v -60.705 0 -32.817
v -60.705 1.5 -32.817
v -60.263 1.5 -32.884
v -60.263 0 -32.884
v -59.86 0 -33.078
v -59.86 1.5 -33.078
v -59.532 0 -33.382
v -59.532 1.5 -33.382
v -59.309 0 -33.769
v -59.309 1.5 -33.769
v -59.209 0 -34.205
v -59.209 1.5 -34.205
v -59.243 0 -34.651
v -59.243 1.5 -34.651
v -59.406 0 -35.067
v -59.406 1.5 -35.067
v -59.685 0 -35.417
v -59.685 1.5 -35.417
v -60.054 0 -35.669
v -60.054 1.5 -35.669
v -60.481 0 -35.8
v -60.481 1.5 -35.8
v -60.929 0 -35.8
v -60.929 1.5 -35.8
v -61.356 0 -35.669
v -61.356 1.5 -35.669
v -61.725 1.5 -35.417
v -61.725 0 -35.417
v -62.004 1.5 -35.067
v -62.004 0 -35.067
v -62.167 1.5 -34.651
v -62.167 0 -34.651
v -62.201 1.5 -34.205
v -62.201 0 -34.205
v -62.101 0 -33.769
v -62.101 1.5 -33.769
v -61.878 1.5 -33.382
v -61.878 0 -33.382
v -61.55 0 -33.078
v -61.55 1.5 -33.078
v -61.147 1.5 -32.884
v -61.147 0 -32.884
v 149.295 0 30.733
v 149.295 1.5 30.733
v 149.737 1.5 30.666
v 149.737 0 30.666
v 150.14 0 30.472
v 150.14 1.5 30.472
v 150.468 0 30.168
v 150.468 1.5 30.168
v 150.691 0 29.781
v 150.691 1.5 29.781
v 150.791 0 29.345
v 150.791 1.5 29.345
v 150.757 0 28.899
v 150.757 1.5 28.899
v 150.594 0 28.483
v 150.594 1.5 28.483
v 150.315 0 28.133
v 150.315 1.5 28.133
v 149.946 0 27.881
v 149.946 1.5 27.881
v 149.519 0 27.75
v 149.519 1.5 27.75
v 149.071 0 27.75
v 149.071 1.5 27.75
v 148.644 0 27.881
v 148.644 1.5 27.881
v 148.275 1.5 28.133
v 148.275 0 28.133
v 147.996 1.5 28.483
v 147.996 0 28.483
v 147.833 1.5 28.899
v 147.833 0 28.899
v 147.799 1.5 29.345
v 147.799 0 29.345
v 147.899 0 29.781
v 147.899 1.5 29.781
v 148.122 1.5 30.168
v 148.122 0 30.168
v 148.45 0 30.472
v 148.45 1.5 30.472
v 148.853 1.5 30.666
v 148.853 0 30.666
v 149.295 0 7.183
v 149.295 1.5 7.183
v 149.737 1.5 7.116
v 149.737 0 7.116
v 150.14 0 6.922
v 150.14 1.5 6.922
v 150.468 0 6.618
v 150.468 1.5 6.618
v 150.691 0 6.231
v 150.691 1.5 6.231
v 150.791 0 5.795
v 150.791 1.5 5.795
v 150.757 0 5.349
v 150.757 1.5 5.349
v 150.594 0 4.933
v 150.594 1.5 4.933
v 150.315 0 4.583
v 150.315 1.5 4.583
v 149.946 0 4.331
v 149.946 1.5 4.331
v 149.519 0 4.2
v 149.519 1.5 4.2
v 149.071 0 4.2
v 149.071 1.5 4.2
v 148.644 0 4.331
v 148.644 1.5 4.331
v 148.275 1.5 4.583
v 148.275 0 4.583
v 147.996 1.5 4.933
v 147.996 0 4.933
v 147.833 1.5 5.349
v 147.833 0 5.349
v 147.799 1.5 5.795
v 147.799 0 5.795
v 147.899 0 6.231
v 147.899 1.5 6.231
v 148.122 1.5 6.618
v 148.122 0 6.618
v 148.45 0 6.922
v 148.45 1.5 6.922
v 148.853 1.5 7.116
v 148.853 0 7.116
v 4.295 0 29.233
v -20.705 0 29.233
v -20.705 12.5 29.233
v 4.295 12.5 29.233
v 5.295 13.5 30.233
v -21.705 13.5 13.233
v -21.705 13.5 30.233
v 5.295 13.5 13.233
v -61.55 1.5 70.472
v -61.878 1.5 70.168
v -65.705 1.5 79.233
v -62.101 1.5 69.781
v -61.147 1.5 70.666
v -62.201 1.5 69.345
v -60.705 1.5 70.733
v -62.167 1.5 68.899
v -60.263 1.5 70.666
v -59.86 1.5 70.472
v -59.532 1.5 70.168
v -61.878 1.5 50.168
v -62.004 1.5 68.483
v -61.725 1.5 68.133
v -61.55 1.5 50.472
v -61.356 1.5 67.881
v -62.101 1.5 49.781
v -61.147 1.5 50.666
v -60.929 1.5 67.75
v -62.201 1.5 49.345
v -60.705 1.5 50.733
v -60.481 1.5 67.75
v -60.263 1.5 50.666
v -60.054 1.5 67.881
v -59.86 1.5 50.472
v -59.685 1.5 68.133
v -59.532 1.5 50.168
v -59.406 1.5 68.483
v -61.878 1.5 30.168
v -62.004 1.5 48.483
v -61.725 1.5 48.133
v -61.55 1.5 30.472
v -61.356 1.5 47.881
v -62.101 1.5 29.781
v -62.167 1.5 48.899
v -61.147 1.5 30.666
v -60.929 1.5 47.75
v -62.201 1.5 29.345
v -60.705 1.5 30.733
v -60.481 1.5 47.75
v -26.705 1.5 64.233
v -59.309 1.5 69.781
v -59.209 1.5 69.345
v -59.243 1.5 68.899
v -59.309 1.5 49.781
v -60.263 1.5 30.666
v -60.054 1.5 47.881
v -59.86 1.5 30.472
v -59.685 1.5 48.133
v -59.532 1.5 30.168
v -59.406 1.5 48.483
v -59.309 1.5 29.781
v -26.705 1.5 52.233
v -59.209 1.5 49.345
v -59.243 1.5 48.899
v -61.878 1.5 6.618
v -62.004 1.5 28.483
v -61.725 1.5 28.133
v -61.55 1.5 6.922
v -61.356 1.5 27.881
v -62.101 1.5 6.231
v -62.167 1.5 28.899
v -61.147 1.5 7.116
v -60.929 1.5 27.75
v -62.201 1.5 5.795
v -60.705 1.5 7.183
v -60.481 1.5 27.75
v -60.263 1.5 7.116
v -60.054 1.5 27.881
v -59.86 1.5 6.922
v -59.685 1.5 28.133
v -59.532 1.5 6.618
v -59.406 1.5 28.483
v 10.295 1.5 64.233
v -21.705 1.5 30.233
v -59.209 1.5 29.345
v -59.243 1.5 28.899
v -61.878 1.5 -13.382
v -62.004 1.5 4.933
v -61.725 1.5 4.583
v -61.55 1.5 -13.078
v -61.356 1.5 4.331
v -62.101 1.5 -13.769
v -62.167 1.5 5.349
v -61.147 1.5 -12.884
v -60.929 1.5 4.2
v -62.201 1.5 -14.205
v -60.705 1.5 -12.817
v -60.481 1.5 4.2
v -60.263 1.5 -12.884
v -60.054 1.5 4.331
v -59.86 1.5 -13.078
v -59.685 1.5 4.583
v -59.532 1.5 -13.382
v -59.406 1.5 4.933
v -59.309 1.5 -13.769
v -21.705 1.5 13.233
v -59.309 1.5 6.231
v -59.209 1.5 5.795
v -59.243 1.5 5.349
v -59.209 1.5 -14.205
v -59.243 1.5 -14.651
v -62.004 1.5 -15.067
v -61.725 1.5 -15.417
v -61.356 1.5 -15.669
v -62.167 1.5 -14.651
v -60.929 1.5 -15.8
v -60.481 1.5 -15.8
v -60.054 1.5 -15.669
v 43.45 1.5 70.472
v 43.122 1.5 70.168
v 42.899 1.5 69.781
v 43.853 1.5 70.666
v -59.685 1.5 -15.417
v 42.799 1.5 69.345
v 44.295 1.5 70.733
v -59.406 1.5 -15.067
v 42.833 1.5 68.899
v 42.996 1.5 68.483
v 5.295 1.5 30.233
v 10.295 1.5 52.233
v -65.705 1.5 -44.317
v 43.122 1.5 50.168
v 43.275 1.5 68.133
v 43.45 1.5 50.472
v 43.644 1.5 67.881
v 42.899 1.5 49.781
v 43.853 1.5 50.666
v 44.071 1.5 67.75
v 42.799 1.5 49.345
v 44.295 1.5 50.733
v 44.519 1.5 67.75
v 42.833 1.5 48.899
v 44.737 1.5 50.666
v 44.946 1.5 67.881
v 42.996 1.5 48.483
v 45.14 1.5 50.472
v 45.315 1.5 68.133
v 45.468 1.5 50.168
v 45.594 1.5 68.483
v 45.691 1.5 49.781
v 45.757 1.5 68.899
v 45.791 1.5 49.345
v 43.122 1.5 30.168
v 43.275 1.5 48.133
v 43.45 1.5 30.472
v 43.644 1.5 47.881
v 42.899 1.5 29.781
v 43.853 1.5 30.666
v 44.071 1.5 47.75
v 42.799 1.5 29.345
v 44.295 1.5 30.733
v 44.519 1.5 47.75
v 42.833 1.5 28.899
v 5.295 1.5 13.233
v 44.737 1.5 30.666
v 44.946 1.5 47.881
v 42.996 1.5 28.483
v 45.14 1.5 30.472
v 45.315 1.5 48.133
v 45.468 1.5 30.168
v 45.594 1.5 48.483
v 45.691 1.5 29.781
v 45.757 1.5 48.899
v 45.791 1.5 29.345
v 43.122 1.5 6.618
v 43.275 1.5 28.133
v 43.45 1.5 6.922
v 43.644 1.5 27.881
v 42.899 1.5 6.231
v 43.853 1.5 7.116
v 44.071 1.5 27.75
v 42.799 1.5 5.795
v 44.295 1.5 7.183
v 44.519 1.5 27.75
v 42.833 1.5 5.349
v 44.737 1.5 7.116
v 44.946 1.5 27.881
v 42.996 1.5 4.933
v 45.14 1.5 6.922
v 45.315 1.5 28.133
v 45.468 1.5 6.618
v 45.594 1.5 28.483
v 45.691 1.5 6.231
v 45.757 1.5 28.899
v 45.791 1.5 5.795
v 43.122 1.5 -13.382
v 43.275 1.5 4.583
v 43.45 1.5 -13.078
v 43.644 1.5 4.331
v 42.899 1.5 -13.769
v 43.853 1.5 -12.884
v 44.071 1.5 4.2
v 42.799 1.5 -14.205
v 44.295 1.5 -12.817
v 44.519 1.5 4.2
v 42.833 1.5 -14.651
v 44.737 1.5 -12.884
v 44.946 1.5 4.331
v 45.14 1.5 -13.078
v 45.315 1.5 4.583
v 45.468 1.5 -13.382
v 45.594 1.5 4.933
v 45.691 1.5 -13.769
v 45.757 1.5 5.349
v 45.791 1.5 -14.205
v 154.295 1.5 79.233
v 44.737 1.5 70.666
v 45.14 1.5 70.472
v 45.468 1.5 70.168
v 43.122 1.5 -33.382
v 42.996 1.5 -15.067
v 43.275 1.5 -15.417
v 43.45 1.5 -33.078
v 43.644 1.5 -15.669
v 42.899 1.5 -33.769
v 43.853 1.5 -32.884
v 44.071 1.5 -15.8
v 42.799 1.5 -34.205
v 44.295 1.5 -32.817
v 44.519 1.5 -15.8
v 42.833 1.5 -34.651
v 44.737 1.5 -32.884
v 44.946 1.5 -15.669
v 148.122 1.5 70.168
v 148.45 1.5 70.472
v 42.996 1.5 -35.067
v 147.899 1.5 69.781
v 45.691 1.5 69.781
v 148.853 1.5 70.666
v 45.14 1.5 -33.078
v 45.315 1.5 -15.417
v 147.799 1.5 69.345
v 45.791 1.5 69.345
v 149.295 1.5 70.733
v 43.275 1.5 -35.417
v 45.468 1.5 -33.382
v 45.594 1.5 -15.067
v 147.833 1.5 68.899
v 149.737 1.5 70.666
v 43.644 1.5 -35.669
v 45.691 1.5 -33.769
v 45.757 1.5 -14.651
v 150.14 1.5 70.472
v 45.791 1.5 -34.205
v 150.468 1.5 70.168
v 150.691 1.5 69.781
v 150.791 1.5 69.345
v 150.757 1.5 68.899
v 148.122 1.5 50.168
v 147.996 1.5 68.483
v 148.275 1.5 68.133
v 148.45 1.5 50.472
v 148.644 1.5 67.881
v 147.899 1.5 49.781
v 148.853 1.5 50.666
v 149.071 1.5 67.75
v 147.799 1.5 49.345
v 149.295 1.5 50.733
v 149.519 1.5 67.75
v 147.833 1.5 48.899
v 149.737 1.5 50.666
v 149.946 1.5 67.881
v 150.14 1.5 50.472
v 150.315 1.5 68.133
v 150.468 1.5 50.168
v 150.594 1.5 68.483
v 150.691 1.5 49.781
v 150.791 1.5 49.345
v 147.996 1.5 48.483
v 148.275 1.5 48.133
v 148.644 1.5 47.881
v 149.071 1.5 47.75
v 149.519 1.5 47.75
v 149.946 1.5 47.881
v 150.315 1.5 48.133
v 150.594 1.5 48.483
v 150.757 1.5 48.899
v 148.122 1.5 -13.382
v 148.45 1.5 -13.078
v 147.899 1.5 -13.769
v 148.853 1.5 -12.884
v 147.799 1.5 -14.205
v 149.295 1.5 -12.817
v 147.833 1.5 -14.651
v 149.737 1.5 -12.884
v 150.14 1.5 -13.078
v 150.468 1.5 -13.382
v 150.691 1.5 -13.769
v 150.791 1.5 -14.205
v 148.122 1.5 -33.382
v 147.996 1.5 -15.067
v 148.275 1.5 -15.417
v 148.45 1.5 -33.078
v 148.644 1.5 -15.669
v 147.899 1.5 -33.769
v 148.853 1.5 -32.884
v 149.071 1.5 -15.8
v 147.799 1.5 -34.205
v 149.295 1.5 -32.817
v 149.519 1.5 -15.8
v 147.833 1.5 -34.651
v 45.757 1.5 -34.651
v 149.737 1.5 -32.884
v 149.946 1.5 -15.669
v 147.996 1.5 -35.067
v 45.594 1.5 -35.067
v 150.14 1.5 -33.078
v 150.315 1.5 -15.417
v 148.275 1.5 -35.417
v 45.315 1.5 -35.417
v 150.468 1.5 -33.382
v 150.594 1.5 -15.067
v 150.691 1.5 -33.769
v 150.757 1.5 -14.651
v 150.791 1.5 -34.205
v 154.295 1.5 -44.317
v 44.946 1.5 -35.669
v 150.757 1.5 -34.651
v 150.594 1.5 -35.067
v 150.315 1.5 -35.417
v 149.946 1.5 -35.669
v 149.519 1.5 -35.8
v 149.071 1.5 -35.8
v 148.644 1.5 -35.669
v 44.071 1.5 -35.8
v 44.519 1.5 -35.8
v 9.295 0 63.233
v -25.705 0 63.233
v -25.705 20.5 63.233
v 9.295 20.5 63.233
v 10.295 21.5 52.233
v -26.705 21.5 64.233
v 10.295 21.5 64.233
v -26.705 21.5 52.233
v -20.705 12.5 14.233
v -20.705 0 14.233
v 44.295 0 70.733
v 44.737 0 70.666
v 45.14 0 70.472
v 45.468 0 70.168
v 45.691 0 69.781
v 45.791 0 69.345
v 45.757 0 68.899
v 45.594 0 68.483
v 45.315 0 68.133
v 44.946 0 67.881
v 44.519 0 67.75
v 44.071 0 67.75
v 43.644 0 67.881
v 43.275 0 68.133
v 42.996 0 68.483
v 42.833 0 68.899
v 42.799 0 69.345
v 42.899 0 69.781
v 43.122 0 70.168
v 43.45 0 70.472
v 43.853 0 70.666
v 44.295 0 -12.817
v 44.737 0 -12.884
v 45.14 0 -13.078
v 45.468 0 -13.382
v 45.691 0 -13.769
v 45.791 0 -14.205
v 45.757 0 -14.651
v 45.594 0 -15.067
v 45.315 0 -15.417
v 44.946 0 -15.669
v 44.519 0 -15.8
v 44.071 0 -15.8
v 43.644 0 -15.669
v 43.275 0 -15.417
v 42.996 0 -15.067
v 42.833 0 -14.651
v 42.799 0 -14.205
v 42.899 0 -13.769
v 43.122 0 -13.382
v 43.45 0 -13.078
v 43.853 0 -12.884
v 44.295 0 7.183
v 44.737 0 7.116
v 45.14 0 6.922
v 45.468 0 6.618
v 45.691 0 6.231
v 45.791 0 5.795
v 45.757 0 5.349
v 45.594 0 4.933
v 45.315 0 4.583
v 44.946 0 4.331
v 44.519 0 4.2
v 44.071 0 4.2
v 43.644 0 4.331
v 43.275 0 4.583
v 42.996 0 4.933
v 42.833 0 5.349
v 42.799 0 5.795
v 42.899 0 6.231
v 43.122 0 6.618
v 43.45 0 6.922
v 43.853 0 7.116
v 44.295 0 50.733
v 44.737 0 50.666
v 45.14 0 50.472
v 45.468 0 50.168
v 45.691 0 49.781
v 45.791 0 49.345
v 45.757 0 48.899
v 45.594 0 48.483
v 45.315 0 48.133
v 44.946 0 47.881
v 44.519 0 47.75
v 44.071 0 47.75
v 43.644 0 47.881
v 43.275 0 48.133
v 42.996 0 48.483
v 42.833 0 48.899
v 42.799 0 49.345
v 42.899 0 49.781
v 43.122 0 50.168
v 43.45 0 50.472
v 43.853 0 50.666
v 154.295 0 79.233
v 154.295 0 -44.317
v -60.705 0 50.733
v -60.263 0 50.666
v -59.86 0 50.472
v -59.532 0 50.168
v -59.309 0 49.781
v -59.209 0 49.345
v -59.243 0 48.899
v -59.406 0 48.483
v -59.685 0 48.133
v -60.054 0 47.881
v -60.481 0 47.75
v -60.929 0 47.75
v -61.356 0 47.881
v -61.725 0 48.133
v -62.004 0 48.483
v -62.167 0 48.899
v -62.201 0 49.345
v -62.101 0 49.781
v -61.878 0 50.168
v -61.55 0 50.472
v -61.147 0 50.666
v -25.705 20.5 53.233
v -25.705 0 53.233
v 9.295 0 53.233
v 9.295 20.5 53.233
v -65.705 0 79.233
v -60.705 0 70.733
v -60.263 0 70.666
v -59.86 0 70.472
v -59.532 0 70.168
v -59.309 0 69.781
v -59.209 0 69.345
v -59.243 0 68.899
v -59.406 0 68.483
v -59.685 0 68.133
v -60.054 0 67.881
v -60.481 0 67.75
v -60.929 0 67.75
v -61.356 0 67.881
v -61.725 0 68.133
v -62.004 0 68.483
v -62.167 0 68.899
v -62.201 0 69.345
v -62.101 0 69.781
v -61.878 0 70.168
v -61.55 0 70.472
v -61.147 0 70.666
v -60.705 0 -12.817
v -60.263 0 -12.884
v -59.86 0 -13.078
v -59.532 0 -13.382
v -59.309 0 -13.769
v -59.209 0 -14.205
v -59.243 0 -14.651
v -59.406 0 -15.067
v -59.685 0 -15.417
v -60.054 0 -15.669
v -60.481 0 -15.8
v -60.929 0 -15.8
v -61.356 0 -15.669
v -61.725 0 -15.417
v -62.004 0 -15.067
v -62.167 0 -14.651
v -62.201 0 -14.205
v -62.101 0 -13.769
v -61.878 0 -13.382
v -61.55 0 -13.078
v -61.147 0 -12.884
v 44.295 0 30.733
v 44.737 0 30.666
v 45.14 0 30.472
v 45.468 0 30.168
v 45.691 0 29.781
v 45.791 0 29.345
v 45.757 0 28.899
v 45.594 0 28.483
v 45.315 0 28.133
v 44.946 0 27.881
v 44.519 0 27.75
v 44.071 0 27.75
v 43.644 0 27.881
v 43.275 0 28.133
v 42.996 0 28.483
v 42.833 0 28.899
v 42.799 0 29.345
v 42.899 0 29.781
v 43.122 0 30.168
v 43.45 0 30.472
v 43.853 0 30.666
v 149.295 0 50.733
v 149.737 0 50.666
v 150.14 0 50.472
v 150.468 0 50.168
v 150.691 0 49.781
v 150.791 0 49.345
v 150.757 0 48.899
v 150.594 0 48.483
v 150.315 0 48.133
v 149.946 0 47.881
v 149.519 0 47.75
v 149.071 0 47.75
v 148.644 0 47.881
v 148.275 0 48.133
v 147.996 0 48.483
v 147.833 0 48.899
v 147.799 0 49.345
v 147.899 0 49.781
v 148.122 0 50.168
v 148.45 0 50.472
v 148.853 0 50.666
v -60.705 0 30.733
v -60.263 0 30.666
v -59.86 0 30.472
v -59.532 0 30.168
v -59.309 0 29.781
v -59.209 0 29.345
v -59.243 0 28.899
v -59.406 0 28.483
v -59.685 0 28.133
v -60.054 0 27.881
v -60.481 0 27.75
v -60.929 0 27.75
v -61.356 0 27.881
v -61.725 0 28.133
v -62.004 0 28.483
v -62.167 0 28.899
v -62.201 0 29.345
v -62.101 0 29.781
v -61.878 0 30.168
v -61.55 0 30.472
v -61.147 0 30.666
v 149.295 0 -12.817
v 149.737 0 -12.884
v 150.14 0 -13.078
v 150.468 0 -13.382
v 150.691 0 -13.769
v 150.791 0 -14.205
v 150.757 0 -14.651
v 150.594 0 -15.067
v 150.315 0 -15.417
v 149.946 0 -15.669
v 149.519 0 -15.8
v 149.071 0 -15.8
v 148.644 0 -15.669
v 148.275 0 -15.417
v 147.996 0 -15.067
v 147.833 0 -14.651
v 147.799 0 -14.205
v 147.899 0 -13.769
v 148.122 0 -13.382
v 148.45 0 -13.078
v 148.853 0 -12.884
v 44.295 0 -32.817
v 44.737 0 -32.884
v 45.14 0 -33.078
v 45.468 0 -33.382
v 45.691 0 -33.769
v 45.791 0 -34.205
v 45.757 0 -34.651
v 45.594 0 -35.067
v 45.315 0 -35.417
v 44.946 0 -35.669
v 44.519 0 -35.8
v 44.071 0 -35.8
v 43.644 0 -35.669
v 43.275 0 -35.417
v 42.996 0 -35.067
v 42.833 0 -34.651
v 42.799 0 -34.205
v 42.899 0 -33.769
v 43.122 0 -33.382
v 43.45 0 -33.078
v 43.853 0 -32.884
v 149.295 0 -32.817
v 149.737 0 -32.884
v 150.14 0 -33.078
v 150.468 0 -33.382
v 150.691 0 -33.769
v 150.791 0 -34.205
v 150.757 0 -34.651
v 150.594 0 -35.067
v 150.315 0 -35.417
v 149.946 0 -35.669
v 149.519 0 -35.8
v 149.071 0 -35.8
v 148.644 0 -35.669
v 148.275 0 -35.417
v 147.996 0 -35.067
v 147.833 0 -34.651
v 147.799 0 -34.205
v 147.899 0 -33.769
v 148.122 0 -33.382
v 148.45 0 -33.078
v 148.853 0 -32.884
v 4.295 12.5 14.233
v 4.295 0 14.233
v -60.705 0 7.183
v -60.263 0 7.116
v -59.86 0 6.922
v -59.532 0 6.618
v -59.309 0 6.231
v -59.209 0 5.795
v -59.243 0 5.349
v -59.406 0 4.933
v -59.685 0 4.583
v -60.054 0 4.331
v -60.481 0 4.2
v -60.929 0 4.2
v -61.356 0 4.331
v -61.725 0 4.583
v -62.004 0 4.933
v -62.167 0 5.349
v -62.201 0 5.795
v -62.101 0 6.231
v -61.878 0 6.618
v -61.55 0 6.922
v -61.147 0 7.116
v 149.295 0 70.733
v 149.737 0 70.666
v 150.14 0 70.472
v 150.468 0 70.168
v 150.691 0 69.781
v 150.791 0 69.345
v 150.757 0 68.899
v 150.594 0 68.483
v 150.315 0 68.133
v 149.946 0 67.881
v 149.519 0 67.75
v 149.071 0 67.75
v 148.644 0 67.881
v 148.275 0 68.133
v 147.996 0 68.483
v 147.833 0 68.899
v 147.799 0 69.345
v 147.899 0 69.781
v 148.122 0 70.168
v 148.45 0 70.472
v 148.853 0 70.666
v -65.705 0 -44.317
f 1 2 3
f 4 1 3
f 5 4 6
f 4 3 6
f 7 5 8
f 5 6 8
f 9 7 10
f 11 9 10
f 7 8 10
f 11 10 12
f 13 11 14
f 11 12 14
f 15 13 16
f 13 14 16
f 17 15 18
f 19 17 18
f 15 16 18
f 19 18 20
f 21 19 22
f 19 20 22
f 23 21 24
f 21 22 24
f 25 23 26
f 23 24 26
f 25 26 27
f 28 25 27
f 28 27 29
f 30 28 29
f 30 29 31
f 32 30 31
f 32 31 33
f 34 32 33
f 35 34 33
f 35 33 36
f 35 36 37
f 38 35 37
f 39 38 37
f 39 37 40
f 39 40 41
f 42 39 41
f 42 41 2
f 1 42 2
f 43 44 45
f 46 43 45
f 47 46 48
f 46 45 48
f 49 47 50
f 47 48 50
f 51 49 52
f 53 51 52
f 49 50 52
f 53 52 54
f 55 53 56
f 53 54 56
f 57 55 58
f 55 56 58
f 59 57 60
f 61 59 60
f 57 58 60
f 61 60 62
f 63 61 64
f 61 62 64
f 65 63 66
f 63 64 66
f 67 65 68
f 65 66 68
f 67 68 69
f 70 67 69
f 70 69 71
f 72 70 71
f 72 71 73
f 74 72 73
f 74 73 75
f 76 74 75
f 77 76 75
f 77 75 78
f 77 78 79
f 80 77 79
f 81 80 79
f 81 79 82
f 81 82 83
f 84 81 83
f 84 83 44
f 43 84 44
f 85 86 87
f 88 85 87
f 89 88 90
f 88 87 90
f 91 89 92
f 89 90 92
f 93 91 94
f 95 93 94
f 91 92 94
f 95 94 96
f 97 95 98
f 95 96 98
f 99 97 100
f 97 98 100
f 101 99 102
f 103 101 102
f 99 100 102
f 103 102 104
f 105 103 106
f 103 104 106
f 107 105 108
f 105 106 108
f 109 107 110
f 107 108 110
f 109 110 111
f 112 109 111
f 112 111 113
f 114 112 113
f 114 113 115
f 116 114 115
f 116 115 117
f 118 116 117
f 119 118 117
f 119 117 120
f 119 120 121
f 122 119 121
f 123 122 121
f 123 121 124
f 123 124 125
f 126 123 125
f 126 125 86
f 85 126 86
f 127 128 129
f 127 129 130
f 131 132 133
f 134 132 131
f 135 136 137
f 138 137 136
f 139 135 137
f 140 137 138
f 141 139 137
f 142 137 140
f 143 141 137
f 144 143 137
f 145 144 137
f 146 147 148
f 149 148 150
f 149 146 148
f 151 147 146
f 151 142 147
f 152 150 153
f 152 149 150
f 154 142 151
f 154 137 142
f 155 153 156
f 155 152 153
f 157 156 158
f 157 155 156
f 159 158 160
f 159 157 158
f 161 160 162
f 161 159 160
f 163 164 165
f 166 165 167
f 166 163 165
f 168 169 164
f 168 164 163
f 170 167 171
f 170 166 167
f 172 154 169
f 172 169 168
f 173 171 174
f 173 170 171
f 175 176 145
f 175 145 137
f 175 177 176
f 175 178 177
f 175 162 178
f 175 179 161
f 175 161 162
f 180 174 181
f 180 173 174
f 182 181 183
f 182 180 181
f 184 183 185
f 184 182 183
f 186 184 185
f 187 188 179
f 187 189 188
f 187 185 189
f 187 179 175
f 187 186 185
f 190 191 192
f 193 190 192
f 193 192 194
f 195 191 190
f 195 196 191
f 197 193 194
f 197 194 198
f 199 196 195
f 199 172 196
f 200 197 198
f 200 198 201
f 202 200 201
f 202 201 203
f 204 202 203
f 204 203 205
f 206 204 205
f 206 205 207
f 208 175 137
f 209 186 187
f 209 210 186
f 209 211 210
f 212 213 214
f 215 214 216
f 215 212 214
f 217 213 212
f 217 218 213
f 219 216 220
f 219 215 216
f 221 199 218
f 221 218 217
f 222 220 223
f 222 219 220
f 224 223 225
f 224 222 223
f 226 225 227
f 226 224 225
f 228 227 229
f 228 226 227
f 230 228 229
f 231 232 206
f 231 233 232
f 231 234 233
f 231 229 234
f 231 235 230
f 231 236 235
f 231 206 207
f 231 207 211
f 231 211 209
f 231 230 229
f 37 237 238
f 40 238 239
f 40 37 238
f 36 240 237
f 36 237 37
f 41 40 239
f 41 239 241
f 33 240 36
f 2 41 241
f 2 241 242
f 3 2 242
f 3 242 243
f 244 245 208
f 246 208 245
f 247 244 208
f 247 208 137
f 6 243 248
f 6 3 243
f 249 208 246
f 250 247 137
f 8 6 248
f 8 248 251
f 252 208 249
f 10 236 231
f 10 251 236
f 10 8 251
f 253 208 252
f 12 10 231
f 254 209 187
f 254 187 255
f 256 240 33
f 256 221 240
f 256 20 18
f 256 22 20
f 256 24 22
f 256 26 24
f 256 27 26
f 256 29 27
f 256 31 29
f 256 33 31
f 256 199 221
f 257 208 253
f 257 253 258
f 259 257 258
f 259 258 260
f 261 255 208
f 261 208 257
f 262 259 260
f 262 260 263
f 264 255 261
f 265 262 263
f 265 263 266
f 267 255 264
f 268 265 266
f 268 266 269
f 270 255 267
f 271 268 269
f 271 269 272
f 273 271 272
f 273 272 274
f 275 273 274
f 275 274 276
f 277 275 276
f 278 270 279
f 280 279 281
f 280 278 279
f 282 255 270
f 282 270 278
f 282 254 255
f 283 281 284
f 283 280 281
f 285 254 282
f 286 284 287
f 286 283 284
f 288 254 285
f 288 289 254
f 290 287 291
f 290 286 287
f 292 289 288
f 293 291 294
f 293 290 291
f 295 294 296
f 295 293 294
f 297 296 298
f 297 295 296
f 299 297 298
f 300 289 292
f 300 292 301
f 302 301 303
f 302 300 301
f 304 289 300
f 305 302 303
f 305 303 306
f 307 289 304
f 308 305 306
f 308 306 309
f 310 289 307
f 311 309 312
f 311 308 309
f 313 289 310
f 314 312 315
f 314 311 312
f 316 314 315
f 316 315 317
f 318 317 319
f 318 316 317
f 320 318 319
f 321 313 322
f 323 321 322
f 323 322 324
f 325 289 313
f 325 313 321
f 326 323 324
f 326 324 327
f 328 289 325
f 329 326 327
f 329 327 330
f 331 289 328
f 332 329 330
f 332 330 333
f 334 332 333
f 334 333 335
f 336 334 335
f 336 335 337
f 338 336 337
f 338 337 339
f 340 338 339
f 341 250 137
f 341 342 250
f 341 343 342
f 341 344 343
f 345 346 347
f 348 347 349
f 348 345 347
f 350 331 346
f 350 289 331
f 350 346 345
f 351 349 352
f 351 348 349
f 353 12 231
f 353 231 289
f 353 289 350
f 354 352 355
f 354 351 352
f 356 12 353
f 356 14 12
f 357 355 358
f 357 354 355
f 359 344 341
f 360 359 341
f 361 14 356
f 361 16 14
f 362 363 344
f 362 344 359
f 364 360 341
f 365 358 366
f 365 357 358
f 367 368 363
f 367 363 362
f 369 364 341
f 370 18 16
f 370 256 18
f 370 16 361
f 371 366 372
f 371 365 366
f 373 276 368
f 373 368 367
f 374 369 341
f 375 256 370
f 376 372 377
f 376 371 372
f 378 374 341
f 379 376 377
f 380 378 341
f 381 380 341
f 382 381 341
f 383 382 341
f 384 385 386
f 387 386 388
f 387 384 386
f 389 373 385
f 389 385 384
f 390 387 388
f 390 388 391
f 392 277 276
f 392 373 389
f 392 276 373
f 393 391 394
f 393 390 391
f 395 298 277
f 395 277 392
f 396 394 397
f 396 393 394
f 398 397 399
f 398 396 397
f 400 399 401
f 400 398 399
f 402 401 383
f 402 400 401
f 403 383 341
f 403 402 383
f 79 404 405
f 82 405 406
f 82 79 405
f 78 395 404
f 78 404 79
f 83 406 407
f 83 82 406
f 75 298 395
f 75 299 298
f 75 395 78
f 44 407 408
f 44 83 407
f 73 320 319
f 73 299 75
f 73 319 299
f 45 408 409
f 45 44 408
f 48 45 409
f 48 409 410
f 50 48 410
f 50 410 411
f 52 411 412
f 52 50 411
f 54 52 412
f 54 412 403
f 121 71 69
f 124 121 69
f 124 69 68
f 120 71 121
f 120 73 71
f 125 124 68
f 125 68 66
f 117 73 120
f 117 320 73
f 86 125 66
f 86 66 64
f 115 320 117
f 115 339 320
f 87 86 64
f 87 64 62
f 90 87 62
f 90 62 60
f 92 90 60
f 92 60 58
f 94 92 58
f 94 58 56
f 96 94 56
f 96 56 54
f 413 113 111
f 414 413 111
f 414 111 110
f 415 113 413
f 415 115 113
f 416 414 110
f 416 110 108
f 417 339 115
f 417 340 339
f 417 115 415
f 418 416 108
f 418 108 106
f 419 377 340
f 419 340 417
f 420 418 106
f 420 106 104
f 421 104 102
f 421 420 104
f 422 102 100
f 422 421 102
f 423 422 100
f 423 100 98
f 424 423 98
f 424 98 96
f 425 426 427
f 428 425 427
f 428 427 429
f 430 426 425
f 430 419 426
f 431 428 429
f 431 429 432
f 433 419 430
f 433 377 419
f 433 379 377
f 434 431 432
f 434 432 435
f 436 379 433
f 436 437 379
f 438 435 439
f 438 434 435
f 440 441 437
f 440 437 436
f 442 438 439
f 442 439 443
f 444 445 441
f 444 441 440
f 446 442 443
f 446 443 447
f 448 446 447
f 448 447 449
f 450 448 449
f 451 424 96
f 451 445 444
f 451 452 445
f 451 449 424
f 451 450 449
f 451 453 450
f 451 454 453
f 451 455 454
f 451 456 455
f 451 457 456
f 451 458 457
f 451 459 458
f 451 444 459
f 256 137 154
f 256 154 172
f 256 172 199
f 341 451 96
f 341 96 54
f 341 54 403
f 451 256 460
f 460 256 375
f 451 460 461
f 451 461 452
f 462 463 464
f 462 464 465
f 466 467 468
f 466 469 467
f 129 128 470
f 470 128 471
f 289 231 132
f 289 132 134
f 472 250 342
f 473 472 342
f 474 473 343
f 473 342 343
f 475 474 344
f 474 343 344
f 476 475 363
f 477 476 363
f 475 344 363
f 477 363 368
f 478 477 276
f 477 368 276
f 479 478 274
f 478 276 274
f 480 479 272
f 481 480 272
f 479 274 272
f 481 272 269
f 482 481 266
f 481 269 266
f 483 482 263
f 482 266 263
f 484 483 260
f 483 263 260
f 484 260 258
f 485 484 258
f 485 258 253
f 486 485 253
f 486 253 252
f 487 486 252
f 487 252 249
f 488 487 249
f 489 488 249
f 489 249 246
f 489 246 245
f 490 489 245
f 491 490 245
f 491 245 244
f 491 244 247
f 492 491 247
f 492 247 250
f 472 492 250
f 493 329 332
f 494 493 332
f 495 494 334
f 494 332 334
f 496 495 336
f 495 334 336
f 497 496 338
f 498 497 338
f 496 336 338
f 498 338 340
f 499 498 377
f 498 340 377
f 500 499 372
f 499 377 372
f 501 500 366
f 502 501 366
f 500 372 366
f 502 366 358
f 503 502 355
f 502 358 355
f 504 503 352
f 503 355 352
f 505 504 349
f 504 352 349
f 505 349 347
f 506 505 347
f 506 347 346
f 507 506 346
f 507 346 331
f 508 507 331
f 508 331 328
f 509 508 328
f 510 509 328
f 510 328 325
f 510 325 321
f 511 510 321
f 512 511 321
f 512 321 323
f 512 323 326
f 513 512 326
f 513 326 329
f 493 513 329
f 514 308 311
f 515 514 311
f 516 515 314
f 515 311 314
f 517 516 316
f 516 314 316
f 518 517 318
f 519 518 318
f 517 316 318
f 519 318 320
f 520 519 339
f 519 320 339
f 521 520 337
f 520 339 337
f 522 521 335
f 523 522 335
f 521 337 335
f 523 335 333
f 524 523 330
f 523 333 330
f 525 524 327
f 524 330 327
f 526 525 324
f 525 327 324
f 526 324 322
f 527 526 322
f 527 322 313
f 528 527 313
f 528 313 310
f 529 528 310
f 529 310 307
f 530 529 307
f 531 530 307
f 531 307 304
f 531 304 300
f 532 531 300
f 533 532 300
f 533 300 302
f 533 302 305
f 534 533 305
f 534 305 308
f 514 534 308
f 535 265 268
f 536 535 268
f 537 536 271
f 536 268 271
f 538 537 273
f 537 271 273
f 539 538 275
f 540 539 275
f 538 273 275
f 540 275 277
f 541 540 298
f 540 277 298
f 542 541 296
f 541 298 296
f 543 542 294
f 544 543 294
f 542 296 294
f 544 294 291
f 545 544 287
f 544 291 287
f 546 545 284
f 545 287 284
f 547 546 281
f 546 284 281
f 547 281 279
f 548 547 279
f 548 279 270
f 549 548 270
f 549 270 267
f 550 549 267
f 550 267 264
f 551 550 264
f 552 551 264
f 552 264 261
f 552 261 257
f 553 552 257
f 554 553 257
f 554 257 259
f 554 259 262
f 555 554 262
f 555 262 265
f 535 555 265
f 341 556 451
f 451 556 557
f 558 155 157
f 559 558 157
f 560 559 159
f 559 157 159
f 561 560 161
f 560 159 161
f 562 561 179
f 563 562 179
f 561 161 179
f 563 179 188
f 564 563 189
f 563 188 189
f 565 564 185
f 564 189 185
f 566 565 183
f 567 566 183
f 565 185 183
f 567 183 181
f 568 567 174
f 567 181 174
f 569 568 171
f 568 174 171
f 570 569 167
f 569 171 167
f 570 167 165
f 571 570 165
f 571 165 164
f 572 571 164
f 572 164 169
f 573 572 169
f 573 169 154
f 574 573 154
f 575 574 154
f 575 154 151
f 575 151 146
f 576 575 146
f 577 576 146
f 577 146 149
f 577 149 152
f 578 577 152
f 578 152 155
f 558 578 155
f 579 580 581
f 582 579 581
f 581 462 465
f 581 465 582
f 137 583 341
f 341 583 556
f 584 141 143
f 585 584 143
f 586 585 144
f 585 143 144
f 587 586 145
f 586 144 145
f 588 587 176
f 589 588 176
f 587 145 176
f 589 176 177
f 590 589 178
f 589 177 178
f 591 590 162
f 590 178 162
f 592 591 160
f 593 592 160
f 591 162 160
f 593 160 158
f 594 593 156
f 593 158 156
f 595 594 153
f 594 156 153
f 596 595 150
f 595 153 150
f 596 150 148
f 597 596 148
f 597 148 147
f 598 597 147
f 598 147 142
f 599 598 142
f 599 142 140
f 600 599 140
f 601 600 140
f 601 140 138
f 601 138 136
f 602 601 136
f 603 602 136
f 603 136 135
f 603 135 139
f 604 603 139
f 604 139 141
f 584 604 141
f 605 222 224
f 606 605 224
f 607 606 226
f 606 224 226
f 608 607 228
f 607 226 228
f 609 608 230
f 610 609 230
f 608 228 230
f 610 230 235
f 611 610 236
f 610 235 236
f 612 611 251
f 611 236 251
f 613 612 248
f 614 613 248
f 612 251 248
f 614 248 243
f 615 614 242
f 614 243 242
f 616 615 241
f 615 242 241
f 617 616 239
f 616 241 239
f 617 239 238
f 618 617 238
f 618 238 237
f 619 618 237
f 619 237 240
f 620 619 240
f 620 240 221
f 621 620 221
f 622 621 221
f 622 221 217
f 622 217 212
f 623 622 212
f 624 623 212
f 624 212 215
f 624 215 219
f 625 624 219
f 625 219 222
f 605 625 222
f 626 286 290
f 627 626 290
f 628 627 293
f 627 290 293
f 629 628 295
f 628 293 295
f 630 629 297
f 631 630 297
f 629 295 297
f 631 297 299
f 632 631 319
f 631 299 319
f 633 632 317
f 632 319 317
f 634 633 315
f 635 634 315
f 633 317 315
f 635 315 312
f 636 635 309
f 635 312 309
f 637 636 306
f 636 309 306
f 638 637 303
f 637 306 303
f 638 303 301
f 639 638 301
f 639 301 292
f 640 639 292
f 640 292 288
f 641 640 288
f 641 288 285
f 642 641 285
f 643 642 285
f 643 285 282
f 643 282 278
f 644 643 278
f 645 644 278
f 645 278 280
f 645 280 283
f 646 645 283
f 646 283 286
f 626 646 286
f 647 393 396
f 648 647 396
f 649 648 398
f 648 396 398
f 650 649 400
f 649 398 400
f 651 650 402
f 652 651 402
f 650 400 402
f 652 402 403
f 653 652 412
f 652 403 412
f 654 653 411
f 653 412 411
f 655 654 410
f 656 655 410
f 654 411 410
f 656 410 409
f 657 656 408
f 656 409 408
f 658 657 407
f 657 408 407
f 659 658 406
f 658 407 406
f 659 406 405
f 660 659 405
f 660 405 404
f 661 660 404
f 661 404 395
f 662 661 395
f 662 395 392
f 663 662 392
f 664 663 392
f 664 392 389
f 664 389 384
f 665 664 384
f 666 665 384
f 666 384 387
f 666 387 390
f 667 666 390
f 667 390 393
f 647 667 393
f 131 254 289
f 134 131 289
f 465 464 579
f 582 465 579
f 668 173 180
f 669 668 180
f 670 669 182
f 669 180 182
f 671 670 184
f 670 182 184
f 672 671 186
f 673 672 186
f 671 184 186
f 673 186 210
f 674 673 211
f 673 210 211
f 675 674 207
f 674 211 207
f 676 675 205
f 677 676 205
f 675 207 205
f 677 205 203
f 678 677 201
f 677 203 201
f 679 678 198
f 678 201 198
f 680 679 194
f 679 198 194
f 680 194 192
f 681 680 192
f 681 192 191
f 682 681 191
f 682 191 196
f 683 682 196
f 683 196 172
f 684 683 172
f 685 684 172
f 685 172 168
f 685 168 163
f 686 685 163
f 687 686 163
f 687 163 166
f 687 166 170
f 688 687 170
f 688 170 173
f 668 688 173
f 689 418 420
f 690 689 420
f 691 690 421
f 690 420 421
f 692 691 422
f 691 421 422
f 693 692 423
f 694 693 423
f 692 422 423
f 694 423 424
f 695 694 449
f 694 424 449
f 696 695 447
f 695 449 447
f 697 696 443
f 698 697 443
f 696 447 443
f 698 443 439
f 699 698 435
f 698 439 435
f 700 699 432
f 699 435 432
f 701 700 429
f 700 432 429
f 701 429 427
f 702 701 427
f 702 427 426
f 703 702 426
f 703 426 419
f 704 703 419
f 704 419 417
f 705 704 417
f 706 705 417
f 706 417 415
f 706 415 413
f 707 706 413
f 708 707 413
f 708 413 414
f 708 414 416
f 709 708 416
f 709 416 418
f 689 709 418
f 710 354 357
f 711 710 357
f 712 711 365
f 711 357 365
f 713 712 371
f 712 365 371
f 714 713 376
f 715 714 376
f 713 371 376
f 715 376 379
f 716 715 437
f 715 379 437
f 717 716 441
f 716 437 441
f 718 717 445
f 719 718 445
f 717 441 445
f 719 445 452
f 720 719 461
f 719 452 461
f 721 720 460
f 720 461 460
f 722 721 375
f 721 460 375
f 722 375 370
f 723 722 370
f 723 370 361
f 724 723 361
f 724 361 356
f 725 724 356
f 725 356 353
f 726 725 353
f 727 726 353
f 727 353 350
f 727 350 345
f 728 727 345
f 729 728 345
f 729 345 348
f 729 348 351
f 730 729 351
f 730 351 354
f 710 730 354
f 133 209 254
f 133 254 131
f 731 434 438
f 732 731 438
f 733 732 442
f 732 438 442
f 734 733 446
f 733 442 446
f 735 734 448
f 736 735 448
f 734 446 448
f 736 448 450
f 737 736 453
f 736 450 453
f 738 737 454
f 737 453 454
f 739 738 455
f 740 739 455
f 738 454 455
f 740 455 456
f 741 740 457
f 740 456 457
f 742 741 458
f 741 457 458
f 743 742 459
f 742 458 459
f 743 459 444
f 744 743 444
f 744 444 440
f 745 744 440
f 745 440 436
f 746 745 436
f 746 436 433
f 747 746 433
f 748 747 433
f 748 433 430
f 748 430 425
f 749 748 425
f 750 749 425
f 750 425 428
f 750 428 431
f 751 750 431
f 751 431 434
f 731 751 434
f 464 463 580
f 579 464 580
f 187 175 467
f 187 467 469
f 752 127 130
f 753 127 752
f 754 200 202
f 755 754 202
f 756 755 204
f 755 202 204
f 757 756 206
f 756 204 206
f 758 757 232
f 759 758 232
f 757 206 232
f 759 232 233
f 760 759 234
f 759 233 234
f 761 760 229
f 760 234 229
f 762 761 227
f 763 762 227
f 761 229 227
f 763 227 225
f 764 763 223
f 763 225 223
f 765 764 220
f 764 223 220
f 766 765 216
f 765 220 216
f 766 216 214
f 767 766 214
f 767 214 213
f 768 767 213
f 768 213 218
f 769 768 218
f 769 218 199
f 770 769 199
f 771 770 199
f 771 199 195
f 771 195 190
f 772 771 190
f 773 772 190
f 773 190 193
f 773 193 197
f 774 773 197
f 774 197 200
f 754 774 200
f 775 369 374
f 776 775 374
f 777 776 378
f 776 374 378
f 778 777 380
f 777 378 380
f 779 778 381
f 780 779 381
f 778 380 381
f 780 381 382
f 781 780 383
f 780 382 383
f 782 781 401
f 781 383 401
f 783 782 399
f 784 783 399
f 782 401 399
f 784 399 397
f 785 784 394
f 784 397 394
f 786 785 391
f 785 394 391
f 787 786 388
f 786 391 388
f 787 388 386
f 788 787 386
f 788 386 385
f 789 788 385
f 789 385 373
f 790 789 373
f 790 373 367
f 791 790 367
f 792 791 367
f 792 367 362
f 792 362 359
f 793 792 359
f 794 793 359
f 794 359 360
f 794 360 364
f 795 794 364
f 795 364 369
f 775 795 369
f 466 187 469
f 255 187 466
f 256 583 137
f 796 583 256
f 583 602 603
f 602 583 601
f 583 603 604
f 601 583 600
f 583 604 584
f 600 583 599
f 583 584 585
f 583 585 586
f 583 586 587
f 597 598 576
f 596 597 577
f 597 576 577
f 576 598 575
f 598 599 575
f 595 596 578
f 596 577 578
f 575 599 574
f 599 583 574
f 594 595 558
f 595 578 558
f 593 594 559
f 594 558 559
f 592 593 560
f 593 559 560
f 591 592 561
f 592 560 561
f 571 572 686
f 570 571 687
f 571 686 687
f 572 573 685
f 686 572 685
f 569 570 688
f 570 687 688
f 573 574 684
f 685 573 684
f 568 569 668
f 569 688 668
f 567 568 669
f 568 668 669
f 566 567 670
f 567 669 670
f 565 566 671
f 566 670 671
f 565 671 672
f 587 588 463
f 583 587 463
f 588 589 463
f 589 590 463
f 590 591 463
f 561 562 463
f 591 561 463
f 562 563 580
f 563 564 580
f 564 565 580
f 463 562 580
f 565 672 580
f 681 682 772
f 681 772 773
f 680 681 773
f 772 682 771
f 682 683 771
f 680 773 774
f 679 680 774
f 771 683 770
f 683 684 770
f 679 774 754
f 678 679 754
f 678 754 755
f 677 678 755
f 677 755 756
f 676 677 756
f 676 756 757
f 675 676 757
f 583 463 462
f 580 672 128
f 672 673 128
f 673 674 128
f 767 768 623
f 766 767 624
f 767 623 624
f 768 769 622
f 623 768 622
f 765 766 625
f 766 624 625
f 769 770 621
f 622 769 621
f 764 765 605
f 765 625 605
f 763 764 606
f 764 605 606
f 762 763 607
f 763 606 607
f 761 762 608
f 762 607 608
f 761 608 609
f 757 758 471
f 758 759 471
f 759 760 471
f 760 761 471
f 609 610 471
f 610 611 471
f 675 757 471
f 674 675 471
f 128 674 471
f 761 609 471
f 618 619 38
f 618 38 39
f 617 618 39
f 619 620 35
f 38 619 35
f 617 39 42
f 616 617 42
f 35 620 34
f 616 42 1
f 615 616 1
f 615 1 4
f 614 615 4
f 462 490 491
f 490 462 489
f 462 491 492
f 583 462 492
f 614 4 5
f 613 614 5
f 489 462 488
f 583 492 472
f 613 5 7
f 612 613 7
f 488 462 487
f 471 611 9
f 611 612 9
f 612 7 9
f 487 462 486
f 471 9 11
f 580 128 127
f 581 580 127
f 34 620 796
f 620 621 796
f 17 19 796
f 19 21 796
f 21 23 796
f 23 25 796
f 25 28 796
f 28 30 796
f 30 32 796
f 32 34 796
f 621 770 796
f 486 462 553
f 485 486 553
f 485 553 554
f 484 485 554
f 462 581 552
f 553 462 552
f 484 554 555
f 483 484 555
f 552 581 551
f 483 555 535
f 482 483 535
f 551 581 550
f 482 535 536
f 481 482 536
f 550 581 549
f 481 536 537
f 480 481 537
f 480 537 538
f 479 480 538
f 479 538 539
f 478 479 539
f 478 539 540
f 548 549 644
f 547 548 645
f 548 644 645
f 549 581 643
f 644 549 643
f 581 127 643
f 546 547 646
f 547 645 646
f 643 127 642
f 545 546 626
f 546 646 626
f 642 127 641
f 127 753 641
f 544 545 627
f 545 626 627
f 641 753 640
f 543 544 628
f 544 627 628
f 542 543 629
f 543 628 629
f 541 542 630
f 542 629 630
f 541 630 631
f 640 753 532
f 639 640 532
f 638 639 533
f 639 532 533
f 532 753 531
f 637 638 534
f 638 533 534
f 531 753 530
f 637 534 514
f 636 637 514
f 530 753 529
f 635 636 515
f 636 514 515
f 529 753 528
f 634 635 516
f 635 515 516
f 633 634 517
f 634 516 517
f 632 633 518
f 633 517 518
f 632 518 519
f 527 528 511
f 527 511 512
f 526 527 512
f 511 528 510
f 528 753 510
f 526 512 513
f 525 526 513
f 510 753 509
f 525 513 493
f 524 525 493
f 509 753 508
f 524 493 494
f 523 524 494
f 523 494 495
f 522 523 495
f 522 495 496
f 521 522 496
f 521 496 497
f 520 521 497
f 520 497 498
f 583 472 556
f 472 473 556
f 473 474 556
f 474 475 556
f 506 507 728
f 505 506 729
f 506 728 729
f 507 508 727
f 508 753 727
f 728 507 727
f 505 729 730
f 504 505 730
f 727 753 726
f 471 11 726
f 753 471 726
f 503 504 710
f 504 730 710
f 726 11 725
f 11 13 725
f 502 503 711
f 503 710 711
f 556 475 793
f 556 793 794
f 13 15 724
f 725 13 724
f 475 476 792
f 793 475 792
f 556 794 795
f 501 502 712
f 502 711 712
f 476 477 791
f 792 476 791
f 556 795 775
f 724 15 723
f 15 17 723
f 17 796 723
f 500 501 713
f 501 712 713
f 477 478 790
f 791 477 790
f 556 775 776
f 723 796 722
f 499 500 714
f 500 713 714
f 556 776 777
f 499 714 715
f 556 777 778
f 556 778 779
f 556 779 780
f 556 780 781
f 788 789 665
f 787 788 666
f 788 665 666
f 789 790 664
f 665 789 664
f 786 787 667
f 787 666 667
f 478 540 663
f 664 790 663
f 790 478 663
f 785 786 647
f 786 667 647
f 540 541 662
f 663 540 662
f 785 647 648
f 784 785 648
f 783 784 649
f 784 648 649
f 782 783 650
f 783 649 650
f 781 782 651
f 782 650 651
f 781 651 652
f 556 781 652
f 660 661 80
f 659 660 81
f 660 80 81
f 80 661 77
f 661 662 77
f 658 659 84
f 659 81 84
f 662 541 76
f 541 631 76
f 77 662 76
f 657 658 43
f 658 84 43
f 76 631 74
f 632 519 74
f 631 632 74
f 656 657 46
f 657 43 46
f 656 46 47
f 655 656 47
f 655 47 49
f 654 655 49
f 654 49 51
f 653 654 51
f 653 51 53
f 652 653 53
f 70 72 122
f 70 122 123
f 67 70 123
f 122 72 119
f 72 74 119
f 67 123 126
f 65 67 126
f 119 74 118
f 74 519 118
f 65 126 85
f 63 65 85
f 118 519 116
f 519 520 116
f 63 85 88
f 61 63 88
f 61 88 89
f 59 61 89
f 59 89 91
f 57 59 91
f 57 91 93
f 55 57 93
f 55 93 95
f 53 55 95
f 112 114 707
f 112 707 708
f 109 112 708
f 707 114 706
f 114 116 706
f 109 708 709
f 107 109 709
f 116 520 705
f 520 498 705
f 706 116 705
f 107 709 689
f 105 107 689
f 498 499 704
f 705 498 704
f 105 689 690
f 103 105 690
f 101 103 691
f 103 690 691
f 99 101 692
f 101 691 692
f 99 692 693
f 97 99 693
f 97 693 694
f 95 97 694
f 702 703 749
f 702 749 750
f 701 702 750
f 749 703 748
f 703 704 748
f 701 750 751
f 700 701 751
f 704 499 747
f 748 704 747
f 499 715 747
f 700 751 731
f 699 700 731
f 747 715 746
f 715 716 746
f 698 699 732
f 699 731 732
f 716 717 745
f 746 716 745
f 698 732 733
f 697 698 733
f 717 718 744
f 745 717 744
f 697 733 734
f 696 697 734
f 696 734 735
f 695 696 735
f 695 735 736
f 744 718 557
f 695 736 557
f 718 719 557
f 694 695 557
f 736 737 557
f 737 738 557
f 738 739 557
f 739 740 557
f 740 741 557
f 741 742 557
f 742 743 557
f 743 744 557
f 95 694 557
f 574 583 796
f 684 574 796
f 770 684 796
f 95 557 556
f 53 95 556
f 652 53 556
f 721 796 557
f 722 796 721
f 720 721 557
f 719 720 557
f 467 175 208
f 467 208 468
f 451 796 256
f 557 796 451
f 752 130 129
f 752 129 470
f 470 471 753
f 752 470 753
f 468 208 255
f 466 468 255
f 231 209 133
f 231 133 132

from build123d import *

# Parameters (mm, degrees)
SKETCH_1_W          = 220
SKETCH_1_H          = 123.55
EXTRUDE_1_DEPTH     = 1.5
SKETCH_2_R          = 1.5
CUT_EXTRUDE_1_DEPTH = 10
SKETCH_3_W          = 35
SKETCH_3_H          = 10
SKETCH_3_W_2        = 25
SKETCH_3_H_2        = 15
CUT_EXTRUDE_2_DEPTH = 174.45613061
SKETCH_3_3_W        = 27
SKETCH_3_3_H        = 17
SKETCH_3_3_W_2      = 25
SKETCH_3_3_H_2      = 15
EXTRUDE_2_DEPTH     = 12
SKETCH_3_4_W        = 37
SKETCH_3_4_H        = 12
SKETCH_3_4_W_2      = 35
SKETCH_3_4_H_2      = 10
EXTRUDE_3_DEPTH     = 20
SKETCH_11_W         = 17
SKETCH_11_H         = 1
EXTRUDE_4_DEPTH     = 25
SKETCH_12_W         = 12
SKETCH_12_H         = 1
EXTRUDE_5_DEPTH     = 35


with BuildPart() as part:
    # 草图1 → 凸台-拉伸1 (new body)
    with BuildSketch(Plane(origin=(0, 0, 0), x_dir=(1, 0, 0), z_dir=(0, 1, 0))):
        with Locations((44.295012832, -17.457747405)):
            Rectangle(SKETCH_1_W, SKETCH_1_H)
    extrude(amount=EXTRUDE_1_DEPTH)

    # 草图2 → 切除-拉伸1 (cut)
    with BuildSketch(Plane(origin=(0, 1.5, 0), x_dir=(1, 0, 0), z_dir=(0, 1, 0))):
        with Locations(Location((149.295012832, -69.232747405, 0), (0, 0, 270))):
            Circle(SKETCH_2_R)
        with Locations(Location((149.295012832, -49.232747405, 0), (0, 0, 270))):
            Circle(SKETCH_2_R)
        with Locations(Location((44.295012832, -49.232747405, 0), (0, 0, 270))):
            Circle(SKETCH_2_R)
        with Locations(Location((44.295012832, -69.232747405, 0), (0, 0, 270))):
            Circle(SKETCH_2_R)
        with Locations(Location((44.295012832, 14.317252595, 0), (0, 0, 270))):
            Circle(SKETCH_2_R)
        with Locations(Location((44.295012832, 34.317252595, 0), (0, 0, 270))):
            Circle(SKETCH_2_R)
        with Locations(Location((149.295012832, 14.317252595, 0), (0, 0, 270))):
            Circle(SKETCH_2_R)
        with Locations(Location((149.295012832, 34.317252595, 0), (0, 0, 270))):
            Circle(SKETCH_2_R)
        with Locations(Location((-60.704987168, 34.317252595, 0), (0, 0, 270))):
            Circle(SKETCH_2_R)
        with Locations(Location((-60.704987168, 14.317252595, 0), (0, 0, 270))):
            Circle(SKETCH_2_R)
        with Locations(Location((-60.704987168, -49.232747405, 0), (0, 0, 270))):
            Circle(SKETCH_2_R)
        with Locations(Location((-60.704987168, -69.232747405, 0), (0, 0, 270))):
            Circle(SKETCH_2_R)
        with Locations(Location((-60.704987168, -29.232747405, 0), (0, 0, 270))):
            Circle(SKETCH_2_R)
        with Locations(Location((-60.704987168, -5.682747405, 0), (0, 0, 270))):
            Circle(SKETCH_2_R)
        with Locations(Location((44.295012832, -5.682747405, 0), (0, 0, 270))):
            Circle(SKETCH_2_R)
        with Locations(Location((44.295012832, -29.232747405, 0), (0, 0, 270))):
            Circle(SKETCH_2_R)
        with Locations(Location((149.295012832, -5.682747405, 0), (0, 0, 270))):
            Circle(SKETCH_2_R)
        with Locations(Location((149.295012832, -29.232747405, 0), (0, 0, 270))):
            Circle(SKETCH_2_R)
    extrude(amount=-CUT_EXTRUDE_1_DEPTH, mode=Mode.SUBTRACT)

    # 草图3 → 切除-拉伸2 (cut, through all)
    with BuildSketch(Plane(origin=(0, 1.5, 0), x_dir=(1, 0, 0), z_dir=(0, 1, 0))):
        with Locations((-8.204987168, -58.232747405)):
            Rectangle(SKETCH_3_W, SKETCH_3_H)
        with Locations((-8.204987168, -21.732747405)):
            Rectangle(SKETCH_3_W_2, SKETCH_3_H_2)
    extrude(amount=-CUT_EXTRUDE_2_DEPTH, mode=Mode.SUBTRACT)

    # 草图3<3> → 凸台-拉伸2 (add)
    with BuildSketch(Plane(origin=(0, 1.5, 0), x_dir=(1, 0, 0), z_dir=(0, 1, 0))):
        with Locations((-8.204987168, -21.732747405)):
            Rectangle(SKETCH_3_3_W, SKETCH_3_3_H)
        with Locations((-8.204987168, -21.732747405)):
            Rectangle(SKETCH_3_3_W_2, SKETCH_3_3_H_2, mode=Mode.SUBTRACT)
    extrude(amount=EXTRUDE_2_DEPTH)

    # 草图3<4> → 凸台-拉伸3 (add)
    with BuildSketch(Plane(origin=(0, 1.5, 0), x_dir=(1, 0, 0), z_dir=(0, 1, 0))):
        with Locations((-8.204987168, -58.232747405)):
            Rectangle(SKETCH_3_4_W, SKETCH_3_4_H)
        with Locations((-8.204987168, -58.232747405)):
            Rectangle(SKETCH_3_4_W_2, SKETCH_3_4_H_2, mode=Mode.SUBTRACT)
    extrude(amount=EXTRUDE_3_DEPTH)

    # 草图11 → 凸台-拉伸4 (add)
    with BuildSketch(Plane(origin=(-20.704987168, 0, 0), x_dir=(0, 0, -1), z_dir=(1, 0, 0))):
        with Locations((-21.732747405, 13)):
            Rectangle(SKETCH_11_W, SKETCH_11_H)
    extrude(amount=EXTRUDE_4_DEPTH)

    # 草图12 → 凸台-拉伸5 (add)
    with BuildSketch(Plane(origin=(-25.704987168, 0, 0), x_dir=(0, 0, -1), z_dir=(1, 0, 0))):
        with Locations((-58.232747405, 21)):
            Rectangle(SKETCH_12_W, SKETCH_12_H)
    extrude(amount=EXTRUDE_5_DEPTH)


solid = part.part
